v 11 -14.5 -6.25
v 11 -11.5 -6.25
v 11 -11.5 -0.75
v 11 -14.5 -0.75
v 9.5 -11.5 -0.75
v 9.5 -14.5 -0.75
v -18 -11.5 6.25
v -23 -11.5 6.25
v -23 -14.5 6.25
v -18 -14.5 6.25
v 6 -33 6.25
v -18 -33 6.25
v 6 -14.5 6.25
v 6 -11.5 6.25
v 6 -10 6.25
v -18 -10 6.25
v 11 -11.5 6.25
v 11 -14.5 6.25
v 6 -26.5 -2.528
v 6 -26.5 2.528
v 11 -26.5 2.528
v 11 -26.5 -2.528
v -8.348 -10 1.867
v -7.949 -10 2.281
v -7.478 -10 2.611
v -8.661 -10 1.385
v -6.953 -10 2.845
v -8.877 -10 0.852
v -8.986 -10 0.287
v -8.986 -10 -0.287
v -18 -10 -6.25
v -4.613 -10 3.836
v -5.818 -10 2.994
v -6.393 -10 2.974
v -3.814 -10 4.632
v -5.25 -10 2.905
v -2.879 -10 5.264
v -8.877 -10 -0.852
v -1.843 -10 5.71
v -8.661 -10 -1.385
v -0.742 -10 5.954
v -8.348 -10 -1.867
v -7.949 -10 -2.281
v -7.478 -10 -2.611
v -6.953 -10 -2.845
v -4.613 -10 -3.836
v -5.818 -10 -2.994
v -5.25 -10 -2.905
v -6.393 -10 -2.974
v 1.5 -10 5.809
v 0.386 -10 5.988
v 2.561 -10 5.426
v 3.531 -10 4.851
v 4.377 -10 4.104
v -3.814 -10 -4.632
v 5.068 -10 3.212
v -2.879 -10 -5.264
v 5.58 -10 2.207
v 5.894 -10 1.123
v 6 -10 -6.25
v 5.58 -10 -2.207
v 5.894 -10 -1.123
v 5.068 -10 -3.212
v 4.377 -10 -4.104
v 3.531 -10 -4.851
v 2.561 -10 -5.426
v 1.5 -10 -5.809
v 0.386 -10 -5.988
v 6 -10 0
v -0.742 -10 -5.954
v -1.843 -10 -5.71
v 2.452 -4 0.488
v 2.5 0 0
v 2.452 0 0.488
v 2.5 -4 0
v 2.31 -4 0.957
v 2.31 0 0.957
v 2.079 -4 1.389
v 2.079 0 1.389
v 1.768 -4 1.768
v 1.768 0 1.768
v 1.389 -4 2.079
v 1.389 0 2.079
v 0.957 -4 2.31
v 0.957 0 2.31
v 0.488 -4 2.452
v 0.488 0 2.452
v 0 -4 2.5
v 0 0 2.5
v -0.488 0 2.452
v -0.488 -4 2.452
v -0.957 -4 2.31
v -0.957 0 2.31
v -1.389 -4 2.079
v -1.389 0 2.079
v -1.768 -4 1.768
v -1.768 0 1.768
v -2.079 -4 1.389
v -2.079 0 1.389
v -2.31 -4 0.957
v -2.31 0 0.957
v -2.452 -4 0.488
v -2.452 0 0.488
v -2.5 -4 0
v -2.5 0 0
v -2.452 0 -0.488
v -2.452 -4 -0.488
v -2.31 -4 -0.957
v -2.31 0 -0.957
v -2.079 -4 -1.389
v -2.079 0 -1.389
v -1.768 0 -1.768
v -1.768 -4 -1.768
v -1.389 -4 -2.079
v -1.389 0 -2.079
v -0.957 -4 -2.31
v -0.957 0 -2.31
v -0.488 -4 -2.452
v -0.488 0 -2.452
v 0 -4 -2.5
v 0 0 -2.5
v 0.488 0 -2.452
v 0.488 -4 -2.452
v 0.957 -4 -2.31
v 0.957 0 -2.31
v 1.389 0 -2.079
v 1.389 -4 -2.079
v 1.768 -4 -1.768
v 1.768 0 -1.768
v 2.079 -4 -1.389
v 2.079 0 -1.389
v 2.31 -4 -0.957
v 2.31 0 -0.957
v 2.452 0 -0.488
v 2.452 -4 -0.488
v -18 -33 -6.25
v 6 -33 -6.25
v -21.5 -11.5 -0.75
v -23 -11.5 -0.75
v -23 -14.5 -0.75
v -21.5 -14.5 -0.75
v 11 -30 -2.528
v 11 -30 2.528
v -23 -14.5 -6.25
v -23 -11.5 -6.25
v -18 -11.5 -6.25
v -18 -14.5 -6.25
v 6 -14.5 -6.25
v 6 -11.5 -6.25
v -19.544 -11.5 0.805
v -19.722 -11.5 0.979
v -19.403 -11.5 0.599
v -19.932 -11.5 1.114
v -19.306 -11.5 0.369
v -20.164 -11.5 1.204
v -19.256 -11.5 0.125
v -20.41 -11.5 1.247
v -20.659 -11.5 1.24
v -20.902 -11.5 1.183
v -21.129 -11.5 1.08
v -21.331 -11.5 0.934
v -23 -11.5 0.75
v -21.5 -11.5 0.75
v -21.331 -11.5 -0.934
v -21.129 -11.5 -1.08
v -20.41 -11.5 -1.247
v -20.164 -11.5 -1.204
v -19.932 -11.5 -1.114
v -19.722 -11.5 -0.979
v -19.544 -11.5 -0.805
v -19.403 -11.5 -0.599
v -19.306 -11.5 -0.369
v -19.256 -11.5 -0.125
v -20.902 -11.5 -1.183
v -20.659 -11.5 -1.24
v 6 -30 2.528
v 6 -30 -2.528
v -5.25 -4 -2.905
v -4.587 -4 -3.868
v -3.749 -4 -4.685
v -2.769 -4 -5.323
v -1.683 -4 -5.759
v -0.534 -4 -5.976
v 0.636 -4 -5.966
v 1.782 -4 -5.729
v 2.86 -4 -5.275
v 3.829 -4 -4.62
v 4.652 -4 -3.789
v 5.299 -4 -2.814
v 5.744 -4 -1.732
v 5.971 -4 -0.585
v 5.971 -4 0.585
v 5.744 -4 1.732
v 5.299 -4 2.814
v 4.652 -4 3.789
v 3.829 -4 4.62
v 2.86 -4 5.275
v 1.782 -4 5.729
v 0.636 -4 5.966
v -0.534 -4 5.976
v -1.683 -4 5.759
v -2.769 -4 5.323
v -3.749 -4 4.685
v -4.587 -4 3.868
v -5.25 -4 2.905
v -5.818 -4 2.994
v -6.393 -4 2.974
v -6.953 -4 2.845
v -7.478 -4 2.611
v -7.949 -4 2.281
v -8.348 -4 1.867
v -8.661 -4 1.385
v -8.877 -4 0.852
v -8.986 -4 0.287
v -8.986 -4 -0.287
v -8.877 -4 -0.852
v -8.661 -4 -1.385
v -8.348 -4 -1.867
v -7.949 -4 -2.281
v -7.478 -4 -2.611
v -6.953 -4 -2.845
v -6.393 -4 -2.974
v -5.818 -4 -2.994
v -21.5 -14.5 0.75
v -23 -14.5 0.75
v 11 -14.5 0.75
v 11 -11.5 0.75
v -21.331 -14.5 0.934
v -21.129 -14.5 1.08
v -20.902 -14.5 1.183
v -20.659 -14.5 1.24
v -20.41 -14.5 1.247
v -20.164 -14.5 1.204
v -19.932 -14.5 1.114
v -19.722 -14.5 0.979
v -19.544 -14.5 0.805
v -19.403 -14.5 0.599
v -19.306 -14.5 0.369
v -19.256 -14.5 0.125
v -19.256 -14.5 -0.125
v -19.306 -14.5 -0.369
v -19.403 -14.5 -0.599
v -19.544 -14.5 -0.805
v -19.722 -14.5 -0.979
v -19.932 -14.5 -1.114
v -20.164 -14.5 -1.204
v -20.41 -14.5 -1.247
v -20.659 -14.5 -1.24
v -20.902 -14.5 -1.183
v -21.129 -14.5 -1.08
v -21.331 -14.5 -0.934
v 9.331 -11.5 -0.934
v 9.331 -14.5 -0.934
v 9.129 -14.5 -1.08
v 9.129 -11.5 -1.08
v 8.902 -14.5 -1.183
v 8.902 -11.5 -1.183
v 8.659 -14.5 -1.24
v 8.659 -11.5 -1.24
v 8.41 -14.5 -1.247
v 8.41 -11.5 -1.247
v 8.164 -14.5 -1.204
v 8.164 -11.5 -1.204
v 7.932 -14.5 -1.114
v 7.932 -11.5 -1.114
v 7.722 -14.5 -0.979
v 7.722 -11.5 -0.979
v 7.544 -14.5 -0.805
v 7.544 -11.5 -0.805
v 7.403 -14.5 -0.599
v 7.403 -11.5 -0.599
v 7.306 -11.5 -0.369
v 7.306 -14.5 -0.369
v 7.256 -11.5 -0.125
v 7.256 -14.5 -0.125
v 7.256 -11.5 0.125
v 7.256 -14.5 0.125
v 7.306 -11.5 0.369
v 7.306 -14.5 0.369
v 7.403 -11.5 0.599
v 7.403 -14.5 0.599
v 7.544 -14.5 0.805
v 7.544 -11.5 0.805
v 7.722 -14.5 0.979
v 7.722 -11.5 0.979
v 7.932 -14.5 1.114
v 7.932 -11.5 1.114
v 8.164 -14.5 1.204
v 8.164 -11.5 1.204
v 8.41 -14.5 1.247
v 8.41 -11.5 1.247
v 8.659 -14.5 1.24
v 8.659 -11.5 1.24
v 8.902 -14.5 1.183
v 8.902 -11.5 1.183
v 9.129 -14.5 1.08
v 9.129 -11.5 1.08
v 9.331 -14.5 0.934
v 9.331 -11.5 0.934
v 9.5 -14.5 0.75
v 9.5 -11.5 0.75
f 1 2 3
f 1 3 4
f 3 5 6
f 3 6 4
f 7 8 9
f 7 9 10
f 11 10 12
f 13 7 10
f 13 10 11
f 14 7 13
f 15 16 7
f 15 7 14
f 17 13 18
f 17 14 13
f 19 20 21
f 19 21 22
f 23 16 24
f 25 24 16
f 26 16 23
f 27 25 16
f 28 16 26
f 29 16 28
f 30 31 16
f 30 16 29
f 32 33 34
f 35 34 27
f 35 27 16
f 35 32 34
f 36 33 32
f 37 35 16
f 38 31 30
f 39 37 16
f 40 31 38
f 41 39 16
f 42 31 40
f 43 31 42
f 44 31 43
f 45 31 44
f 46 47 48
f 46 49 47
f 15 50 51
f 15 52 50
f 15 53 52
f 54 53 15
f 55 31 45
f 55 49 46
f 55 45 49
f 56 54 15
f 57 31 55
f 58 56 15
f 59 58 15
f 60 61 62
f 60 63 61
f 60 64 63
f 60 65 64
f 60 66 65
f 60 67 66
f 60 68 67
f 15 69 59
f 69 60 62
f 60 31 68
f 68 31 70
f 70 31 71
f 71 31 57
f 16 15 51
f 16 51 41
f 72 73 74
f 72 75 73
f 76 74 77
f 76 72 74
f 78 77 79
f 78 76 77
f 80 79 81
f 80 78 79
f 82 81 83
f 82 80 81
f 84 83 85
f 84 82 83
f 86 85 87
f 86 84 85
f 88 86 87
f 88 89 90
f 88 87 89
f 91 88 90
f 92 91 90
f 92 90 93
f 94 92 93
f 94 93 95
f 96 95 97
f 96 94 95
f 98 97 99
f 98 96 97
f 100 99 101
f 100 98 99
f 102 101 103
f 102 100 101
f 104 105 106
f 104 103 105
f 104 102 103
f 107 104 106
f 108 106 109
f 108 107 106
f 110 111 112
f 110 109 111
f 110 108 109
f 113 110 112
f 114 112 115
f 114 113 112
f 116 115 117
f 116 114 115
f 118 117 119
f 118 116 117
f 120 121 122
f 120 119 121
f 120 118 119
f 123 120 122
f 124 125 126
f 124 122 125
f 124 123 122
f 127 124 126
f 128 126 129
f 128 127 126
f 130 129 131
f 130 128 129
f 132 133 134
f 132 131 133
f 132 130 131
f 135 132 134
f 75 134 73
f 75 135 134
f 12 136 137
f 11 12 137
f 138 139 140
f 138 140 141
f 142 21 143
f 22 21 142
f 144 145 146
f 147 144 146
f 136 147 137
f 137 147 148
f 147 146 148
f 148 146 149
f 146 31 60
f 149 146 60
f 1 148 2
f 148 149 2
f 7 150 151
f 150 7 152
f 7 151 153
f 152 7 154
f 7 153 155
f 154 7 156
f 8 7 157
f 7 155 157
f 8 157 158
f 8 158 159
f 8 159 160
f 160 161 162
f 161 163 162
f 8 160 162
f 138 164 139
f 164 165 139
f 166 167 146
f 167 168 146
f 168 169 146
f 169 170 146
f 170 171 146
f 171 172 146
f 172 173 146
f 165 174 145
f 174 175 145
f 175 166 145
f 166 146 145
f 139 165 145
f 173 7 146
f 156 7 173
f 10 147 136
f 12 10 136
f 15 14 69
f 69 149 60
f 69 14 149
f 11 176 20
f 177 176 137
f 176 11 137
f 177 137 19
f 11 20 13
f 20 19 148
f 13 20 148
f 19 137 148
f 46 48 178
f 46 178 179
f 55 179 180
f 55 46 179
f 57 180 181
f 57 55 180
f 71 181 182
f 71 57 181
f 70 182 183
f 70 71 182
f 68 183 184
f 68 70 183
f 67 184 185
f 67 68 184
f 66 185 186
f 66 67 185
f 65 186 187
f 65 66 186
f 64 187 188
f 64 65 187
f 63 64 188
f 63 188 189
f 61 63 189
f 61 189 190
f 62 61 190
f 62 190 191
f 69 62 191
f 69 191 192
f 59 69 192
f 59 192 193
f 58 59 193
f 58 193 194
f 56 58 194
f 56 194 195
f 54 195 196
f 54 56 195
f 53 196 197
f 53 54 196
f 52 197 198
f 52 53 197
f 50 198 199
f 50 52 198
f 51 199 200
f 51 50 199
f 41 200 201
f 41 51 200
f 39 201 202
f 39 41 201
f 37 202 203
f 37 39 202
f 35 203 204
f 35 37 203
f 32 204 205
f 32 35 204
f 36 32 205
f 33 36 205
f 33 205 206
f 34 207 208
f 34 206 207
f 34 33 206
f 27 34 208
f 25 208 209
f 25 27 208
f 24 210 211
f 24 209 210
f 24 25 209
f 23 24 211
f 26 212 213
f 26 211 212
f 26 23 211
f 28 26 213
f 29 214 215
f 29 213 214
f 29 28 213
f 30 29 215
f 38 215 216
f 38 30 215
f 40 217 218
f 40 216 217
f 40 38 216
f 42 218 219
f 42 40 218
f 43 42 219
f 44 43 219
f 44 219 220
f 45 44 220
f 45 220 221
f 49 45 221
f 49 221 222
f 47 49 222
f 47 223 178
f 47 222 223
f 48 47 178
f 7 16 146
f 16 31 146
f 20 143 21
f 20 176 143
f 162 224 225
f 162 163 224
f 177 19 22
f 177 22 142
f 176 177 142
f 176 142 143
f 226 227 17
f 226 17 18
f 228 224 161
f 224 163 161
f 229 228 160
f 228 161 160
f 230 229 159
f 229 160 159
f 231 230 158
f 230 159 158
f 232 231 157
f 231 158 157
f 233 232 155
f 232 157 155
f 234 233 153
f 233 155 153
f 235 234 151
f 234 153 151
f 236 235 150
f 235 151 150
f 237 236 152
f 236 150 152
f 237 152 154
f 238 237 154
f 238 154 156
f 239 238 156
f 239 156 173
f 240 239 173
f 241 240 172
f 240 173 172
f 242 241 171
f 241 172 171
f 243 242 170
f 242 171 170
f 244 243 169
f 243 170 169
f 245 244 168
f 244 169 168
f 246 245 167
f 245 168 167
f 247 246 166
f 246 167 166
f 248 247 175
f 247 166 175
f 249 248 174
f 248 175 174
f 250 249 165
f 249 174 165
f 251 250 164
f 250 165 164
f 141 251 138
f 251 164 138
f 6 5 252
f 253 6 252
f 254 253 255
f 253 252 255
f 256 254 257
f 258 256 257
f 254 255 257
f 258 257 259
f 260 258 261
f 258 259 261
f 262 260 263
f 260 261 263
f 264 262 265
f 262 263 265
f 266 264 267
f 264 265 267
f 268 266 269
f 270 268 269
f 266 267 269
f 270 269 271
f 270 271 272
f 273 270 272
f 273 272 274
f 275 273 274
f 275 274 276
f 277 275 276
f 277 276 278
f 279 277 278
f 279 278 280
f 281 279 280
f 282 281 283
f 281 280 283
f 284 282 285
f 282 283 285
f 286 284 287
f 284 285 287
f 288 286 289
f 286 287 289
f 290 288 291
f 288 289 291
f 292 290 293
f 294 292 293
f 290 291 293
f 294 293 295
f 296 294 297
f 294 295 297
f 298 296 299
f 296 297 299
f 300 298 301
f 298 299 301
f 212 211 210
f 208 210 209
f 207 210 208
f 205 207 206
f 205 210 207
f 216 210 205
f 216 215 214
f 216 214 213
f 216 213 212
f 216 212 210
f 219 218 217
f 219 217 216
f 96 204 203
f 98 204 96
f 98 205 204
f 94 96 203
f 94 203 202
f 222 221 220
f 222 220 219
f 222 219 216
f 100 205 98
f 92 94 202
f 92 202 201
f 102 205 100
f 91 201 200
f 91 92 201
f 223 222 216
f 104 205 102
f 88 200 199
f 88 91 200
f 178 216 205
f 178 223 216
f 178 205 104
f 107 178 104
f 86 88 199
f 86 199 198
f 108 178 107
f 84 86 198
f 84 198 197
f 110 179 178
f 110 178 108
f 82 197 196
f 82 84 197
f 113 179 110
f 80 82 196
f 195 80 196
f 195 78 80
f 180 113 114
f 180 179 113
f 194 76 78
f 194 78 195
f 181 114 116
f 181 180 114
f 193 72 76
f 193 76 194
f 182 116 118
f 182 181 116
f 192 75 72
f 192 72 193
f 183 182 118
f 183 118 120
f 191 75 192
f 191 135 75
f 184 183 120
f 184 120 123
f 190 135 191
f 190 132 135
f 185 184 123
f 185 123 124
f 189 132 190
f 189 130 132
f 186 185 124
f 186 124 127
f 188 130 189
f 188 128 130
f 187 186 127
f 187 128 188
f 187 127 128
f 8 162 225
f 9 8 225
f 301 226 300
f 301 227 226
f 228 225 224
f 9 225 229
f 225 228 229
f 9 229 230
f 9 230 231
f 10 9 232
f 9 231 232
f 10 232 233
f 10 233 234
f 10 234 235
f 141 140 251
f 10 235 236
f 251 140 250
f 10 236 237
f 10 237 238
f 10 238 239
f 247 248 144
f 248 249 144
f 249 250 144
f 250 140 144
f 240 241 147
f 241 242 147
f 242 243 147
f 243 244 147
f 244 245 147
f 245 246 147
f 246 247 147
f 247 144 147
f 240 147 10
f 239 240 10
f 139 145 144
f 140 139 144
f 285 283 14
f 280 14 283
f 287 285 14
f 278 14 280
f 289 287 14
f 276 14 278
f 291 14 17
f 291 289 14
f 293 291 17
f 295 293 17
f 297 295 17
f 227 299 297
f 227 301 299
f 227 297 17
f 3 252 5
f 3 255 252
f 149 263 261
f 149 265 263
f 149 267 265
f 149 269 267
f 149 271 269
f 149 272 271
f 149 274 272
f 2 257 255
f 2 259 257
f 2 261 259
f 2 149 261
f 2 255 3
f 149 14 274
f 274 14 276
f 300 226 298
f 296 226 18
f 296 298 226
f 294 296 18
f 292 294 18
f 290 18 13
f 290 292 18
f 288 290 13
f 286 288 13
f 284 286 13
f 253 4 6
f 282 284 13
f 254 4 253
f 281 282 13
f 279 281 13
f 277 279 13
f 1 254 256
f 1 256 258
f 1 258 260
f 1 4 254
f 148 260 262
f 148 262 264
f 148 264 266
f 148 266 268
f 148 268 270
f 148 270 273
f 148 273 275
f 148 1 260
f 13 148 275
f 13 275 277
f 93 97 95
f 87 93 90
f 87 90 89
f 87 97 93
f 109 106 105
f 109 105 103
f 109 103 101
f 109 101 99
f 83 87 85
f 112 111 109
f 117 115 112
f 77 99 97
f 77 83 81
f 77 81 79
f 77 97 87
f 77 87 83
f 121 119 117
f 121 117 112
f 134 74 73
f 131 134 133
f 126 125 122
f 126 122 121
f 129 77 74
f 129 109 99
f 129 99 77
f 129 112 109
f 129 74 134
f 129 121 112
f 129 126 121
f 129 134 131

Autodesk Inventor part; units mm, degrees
ref_plane "YZ Plane" through (0, 0, 0) normal (1, 0, 0) x (0, 1, 0)
ref_plane "XZ Plane" through (0, 0, 0) normal (0, 1, 0) x (-1, 0, 0)
ref_plane "XY Plane" through (0, 0, 0) normal (0, 0, 1) x (1, 0, 0)
sketch "Sketch1" plane through (0, 0, 0) normal (0, 0, 1) x (1, 0, 0)
  line L0 (-2.5, 0) -> (2.5, 0)
  line L1 (2.5, 0) -> (2.5, -4)
  line L2 (2.5, -4) -> (-2.5, -4)
  line L3 (-2.5, -4) -> (-2.5, 0)
  line L4 (6, -4) -> (-9, -4)
  line L5 (-9, -4) -> (-9, -10)
  line L6 (-9, -10) -> (6, -10)
  line L7 (6, -10) -> (6, -4)
  line L8 (6, -10) -> (-18, -10)
  line L9 (-18, -10) -> (-18, -33)
  line L10 (-18, -33) -> (6, -33)
  line L11 (6, -33) -> (6, -10)
  line L12 (-18, -11.5) -> (-23, -11.5)
  line L13 (-23, -11.5) -> (-23, -14.5)
  line L14 (-23, -14.5) -> (-18, -14.5)
  line L15 (-18, -14.5) -> (-18, -11.5)
  line L16 (6, -11.5) -> (11, -11.5)
  line L17 (11, -11.5) -> (11, -14.5)
  line L18 (11, -14.5) -> (6, -14.5)
  line L19 (6, -14.5) -> (6, -11.5)
  line L20 (-6, -33) -> (-6, -10) construction
  point P0 (0, 0)
  point P1 (0, -4)
  point P2 (11, -13)
  point P3 (-23, -13)
  point P4 (-9, -7)
  point P5 (0, 0)
  point P6 (-18, -14.5)
  point P7 (6, -14.5)
  dimension "d0" = 5
  dimension "d1" = 4
  dimension "d2" = 6
  dimension "d3" = 6
  dimension "d4" = 24
  dimension "d6" = 34
  dimension "d7" = 9
  dimension "d8" = 1.5
  dimension "d9" = 3
  dimension "d31" = 18.5
extrude "Extrusion1" add sketch "Sketch1" along normal mid plane 12.5 contours L6 L11 L10 L9 L8 | L16 L17 L18 L11 | L9 L14 L13 L12
sketch "Sketch2" plane through (-18, -10, 6.25) normal (0, 1, 0) x (1, 0, 0)
  circle A0 centre (18, 6.25) radius 6
  line L0 (24, 12.5) -> (24, 0) construction
  circle A1 centre (12, 6.25) radius 3
  line L1 (0, 12.5) -> (0, 0) construction
  point P0 (9, 6.25)
  point P1 (0, 6.25)
  point P2 (12.75, 9.1547)
  point P3 (12.75, 3.3453)
  dimension "d12" = 9
extrude "Extrusion2" add sketch "Sketch2" along normal blind 6
sketch "Sketch3" plane through (-18, -4, 6.25) normal (0, 1, 0) x (1, 0, 0)
  circle A0 centre (18, 6.25) radius 2.5
  dimension "d15" = 5
extrude "Extrusion3" add sketch "Sketch3" along normal blind 4
sketch "Sketch4" plane through (6, -33, 6.25) normal (1, 0, 0) x (0, 0, -1)
  line L0 (3.7222, 6.5) -> (8.7778, 6.5)
  line L1 (8.7778, 6.5) -> (8.7778, 3)
  line L2 (8.7778, 3) -> (3.7222, 3)
  line L3 (3.7222, 3) -> (3.7222, 6.5)
  line L4 (0, 0) -> (0, 18.5) construction
  line L5 (0, 6.5) -> (3.7222, 6.5) construction
  line L6 (8.7778, 6.5) -> (12.5, 6.5) construction
  line L7 (12.5, 18.5) -> (12.5, 0) construction
  line L8 (12.5, 0) -> (0, 0) construction
  line L9 (12.5, 18.5) -> (0, 18.5) construction
  point P0 (6.25, 33)
  point P1 (6.25, 18.5)
  point P2 (6.25, 6.5)
  dimension "d18" = 3
  dimension "d19" = 12
extrude "Extrusion4" add sketch "Sketch4" along normal blind 5
sketch "Sketch5" plane through (6, -11.5, 6.25) normal (0, 1, 0) x (1, 0, 0)
  line L0 (-29, 12.5) -> (-29, 0) construction
  line L1 (-24, 0) -> (-29, 0) construction
  line L2 (-24, 12.5) -> (-24, 0) construction
  line L3 (-29, 12.5) -> (-24, 12.5) construction
  line L4 (0, 12.5) -> (0, 0) construction
  line L5 (5, 0) -> (0, 0) construction
  line L6 (5, 12.5) -> (5, 0) construction
  line L7 (0, 12.5) -> (5, 12.5) construction
  line L8 (-29, 6.25) -> (5, 6.25) construction
  line L9 (5, 3.7222) -> (5, 8.7778) construction
  circle A0 centre (-26.5, 6.25) radius 1.25
  circle A1 centre (2.5, 6.25) radius 1.25
  line L10 (-12, 6.25) -> (-12, 12.5) construction
  line L11 (-27.5, 5.5) -> (-29, 5.5)
  line L12 (-29, 5.5) -> (-29, 7)
  line L13 (-29, 7) -> (-27.5, 7)
  line L14 (-27.5, 7) -> (-27.5, 5.5)
  line L15 (3.5, 7) -> (5, 7)
  line L16 (5, 7) -> (5, 5.5)
  line L17 (5, 5.5) -> (3.5, 5.5)
  line L18 (3.5, 5.5) -> (3.5, 7)
  line L19 (3.5, 7) -> (5, 5.5) construction
  line L20 (5, 7) -> (3.5, 5.5) construction
  point P0 (-6, 6.25)
  point P1 (4.25, 6.25)
  point P2 (3.5, 5.5)
  dimension "d22" = 2.5
  dimension "d23" = 29
  dimension "d24" = 1.5
  dimension "d25" = 1.5
extrude "Extrusion5" cut sketch "Sketch5" against normal blind 3
sketch "草圖7" plane through (0, 0, 0) normal (0, 1, 0) x (1, 0, 0)
  line L0 (-23, 0.75) -> (-21.5, 0.75) projected
  arc A0 (-21.5, -0.75) -> (-21.5, 0.75) centre (-20.5, 0) ccw projected
  line L1 (-21.5, -0.75) -> (-23, -0.75) projected
  line L2 (-23, -0.75) -> (-23, -6.25) projected
  line L3 (-18, -6.25) -> (-23, -6.25) projected
  line L4 (-18, 6.25) -> (-18, -6.25) projected
  line L5 (-23, 6.25) -> (-18, 6.25) projected
  line L6 (-23, 6.25) -> (-23, 0.75) projected
  line L7 (-18, 6.25) -> (-18, -6.25) projected
  line L8 (6, -6.25) -> (-18, -6.25) projected
  line L9 (6, 0) -> (6, -6.25) projected
  arc A1 (-5.25, -2.9047) -> (6, 0) centre (0, 0) ccw projected
  arc A2 (-5.25, 2.9047) -> (-5.25, -2.9047) centre (-6, 0) ccw projected
  arc A3 (6, 0) -> (-5.25, 2.9047) centre (0, 0) ccw projected
  line L10 (6, 6.25) -> (6, 0) projected
  line L11 (-18, 6.25) -> (6, 6.25) projected
  circle A4 centre (0, 0) radius 2.5 projected
  arc A5 (-5.25, -2.9047) -> (-5.25, 2.9047) centre (0, 0) ccw projected
  arc A6 (-5.25, 2.9047) -> (-5.25, -2.9047) centre (-6, 0) ccw projected
  circle A7 centre (0, 0) radius 2.5 projected
  line L12 (11, -0.75) -> (9.5, -0.75) projected
  arc A8 (9.5, 0.75) -> (9.5, -0.75) centre (8.5, 0) ccw projected
  line L13 (9.5, 0.75) -> (11, 0.75) projected
  line L14 (11, 6.25) -> (11, 0.75) projected
  line L15 (6, 6.25) -> (11, 6.25) projected
  line L16 (6, 6.25) -> (6, -6.25) projected
  line L17 (11, -6.25) -> (6, -6.25) projected
  line L18 (11, -0.75) -> (11, -6.25) projected
  point P0 (0, 0)
sketch "Sketch6" plane through (0, 0, 0) normal (0, 1, 0) x (1, 0, 0)
  circle A0 centre (0, 0) radius 2.5 projected
  circle A1 centre (0, 0) radius 10
  point P0 (0, 0)
  dimension "d28" = 20
properties part number "S"
